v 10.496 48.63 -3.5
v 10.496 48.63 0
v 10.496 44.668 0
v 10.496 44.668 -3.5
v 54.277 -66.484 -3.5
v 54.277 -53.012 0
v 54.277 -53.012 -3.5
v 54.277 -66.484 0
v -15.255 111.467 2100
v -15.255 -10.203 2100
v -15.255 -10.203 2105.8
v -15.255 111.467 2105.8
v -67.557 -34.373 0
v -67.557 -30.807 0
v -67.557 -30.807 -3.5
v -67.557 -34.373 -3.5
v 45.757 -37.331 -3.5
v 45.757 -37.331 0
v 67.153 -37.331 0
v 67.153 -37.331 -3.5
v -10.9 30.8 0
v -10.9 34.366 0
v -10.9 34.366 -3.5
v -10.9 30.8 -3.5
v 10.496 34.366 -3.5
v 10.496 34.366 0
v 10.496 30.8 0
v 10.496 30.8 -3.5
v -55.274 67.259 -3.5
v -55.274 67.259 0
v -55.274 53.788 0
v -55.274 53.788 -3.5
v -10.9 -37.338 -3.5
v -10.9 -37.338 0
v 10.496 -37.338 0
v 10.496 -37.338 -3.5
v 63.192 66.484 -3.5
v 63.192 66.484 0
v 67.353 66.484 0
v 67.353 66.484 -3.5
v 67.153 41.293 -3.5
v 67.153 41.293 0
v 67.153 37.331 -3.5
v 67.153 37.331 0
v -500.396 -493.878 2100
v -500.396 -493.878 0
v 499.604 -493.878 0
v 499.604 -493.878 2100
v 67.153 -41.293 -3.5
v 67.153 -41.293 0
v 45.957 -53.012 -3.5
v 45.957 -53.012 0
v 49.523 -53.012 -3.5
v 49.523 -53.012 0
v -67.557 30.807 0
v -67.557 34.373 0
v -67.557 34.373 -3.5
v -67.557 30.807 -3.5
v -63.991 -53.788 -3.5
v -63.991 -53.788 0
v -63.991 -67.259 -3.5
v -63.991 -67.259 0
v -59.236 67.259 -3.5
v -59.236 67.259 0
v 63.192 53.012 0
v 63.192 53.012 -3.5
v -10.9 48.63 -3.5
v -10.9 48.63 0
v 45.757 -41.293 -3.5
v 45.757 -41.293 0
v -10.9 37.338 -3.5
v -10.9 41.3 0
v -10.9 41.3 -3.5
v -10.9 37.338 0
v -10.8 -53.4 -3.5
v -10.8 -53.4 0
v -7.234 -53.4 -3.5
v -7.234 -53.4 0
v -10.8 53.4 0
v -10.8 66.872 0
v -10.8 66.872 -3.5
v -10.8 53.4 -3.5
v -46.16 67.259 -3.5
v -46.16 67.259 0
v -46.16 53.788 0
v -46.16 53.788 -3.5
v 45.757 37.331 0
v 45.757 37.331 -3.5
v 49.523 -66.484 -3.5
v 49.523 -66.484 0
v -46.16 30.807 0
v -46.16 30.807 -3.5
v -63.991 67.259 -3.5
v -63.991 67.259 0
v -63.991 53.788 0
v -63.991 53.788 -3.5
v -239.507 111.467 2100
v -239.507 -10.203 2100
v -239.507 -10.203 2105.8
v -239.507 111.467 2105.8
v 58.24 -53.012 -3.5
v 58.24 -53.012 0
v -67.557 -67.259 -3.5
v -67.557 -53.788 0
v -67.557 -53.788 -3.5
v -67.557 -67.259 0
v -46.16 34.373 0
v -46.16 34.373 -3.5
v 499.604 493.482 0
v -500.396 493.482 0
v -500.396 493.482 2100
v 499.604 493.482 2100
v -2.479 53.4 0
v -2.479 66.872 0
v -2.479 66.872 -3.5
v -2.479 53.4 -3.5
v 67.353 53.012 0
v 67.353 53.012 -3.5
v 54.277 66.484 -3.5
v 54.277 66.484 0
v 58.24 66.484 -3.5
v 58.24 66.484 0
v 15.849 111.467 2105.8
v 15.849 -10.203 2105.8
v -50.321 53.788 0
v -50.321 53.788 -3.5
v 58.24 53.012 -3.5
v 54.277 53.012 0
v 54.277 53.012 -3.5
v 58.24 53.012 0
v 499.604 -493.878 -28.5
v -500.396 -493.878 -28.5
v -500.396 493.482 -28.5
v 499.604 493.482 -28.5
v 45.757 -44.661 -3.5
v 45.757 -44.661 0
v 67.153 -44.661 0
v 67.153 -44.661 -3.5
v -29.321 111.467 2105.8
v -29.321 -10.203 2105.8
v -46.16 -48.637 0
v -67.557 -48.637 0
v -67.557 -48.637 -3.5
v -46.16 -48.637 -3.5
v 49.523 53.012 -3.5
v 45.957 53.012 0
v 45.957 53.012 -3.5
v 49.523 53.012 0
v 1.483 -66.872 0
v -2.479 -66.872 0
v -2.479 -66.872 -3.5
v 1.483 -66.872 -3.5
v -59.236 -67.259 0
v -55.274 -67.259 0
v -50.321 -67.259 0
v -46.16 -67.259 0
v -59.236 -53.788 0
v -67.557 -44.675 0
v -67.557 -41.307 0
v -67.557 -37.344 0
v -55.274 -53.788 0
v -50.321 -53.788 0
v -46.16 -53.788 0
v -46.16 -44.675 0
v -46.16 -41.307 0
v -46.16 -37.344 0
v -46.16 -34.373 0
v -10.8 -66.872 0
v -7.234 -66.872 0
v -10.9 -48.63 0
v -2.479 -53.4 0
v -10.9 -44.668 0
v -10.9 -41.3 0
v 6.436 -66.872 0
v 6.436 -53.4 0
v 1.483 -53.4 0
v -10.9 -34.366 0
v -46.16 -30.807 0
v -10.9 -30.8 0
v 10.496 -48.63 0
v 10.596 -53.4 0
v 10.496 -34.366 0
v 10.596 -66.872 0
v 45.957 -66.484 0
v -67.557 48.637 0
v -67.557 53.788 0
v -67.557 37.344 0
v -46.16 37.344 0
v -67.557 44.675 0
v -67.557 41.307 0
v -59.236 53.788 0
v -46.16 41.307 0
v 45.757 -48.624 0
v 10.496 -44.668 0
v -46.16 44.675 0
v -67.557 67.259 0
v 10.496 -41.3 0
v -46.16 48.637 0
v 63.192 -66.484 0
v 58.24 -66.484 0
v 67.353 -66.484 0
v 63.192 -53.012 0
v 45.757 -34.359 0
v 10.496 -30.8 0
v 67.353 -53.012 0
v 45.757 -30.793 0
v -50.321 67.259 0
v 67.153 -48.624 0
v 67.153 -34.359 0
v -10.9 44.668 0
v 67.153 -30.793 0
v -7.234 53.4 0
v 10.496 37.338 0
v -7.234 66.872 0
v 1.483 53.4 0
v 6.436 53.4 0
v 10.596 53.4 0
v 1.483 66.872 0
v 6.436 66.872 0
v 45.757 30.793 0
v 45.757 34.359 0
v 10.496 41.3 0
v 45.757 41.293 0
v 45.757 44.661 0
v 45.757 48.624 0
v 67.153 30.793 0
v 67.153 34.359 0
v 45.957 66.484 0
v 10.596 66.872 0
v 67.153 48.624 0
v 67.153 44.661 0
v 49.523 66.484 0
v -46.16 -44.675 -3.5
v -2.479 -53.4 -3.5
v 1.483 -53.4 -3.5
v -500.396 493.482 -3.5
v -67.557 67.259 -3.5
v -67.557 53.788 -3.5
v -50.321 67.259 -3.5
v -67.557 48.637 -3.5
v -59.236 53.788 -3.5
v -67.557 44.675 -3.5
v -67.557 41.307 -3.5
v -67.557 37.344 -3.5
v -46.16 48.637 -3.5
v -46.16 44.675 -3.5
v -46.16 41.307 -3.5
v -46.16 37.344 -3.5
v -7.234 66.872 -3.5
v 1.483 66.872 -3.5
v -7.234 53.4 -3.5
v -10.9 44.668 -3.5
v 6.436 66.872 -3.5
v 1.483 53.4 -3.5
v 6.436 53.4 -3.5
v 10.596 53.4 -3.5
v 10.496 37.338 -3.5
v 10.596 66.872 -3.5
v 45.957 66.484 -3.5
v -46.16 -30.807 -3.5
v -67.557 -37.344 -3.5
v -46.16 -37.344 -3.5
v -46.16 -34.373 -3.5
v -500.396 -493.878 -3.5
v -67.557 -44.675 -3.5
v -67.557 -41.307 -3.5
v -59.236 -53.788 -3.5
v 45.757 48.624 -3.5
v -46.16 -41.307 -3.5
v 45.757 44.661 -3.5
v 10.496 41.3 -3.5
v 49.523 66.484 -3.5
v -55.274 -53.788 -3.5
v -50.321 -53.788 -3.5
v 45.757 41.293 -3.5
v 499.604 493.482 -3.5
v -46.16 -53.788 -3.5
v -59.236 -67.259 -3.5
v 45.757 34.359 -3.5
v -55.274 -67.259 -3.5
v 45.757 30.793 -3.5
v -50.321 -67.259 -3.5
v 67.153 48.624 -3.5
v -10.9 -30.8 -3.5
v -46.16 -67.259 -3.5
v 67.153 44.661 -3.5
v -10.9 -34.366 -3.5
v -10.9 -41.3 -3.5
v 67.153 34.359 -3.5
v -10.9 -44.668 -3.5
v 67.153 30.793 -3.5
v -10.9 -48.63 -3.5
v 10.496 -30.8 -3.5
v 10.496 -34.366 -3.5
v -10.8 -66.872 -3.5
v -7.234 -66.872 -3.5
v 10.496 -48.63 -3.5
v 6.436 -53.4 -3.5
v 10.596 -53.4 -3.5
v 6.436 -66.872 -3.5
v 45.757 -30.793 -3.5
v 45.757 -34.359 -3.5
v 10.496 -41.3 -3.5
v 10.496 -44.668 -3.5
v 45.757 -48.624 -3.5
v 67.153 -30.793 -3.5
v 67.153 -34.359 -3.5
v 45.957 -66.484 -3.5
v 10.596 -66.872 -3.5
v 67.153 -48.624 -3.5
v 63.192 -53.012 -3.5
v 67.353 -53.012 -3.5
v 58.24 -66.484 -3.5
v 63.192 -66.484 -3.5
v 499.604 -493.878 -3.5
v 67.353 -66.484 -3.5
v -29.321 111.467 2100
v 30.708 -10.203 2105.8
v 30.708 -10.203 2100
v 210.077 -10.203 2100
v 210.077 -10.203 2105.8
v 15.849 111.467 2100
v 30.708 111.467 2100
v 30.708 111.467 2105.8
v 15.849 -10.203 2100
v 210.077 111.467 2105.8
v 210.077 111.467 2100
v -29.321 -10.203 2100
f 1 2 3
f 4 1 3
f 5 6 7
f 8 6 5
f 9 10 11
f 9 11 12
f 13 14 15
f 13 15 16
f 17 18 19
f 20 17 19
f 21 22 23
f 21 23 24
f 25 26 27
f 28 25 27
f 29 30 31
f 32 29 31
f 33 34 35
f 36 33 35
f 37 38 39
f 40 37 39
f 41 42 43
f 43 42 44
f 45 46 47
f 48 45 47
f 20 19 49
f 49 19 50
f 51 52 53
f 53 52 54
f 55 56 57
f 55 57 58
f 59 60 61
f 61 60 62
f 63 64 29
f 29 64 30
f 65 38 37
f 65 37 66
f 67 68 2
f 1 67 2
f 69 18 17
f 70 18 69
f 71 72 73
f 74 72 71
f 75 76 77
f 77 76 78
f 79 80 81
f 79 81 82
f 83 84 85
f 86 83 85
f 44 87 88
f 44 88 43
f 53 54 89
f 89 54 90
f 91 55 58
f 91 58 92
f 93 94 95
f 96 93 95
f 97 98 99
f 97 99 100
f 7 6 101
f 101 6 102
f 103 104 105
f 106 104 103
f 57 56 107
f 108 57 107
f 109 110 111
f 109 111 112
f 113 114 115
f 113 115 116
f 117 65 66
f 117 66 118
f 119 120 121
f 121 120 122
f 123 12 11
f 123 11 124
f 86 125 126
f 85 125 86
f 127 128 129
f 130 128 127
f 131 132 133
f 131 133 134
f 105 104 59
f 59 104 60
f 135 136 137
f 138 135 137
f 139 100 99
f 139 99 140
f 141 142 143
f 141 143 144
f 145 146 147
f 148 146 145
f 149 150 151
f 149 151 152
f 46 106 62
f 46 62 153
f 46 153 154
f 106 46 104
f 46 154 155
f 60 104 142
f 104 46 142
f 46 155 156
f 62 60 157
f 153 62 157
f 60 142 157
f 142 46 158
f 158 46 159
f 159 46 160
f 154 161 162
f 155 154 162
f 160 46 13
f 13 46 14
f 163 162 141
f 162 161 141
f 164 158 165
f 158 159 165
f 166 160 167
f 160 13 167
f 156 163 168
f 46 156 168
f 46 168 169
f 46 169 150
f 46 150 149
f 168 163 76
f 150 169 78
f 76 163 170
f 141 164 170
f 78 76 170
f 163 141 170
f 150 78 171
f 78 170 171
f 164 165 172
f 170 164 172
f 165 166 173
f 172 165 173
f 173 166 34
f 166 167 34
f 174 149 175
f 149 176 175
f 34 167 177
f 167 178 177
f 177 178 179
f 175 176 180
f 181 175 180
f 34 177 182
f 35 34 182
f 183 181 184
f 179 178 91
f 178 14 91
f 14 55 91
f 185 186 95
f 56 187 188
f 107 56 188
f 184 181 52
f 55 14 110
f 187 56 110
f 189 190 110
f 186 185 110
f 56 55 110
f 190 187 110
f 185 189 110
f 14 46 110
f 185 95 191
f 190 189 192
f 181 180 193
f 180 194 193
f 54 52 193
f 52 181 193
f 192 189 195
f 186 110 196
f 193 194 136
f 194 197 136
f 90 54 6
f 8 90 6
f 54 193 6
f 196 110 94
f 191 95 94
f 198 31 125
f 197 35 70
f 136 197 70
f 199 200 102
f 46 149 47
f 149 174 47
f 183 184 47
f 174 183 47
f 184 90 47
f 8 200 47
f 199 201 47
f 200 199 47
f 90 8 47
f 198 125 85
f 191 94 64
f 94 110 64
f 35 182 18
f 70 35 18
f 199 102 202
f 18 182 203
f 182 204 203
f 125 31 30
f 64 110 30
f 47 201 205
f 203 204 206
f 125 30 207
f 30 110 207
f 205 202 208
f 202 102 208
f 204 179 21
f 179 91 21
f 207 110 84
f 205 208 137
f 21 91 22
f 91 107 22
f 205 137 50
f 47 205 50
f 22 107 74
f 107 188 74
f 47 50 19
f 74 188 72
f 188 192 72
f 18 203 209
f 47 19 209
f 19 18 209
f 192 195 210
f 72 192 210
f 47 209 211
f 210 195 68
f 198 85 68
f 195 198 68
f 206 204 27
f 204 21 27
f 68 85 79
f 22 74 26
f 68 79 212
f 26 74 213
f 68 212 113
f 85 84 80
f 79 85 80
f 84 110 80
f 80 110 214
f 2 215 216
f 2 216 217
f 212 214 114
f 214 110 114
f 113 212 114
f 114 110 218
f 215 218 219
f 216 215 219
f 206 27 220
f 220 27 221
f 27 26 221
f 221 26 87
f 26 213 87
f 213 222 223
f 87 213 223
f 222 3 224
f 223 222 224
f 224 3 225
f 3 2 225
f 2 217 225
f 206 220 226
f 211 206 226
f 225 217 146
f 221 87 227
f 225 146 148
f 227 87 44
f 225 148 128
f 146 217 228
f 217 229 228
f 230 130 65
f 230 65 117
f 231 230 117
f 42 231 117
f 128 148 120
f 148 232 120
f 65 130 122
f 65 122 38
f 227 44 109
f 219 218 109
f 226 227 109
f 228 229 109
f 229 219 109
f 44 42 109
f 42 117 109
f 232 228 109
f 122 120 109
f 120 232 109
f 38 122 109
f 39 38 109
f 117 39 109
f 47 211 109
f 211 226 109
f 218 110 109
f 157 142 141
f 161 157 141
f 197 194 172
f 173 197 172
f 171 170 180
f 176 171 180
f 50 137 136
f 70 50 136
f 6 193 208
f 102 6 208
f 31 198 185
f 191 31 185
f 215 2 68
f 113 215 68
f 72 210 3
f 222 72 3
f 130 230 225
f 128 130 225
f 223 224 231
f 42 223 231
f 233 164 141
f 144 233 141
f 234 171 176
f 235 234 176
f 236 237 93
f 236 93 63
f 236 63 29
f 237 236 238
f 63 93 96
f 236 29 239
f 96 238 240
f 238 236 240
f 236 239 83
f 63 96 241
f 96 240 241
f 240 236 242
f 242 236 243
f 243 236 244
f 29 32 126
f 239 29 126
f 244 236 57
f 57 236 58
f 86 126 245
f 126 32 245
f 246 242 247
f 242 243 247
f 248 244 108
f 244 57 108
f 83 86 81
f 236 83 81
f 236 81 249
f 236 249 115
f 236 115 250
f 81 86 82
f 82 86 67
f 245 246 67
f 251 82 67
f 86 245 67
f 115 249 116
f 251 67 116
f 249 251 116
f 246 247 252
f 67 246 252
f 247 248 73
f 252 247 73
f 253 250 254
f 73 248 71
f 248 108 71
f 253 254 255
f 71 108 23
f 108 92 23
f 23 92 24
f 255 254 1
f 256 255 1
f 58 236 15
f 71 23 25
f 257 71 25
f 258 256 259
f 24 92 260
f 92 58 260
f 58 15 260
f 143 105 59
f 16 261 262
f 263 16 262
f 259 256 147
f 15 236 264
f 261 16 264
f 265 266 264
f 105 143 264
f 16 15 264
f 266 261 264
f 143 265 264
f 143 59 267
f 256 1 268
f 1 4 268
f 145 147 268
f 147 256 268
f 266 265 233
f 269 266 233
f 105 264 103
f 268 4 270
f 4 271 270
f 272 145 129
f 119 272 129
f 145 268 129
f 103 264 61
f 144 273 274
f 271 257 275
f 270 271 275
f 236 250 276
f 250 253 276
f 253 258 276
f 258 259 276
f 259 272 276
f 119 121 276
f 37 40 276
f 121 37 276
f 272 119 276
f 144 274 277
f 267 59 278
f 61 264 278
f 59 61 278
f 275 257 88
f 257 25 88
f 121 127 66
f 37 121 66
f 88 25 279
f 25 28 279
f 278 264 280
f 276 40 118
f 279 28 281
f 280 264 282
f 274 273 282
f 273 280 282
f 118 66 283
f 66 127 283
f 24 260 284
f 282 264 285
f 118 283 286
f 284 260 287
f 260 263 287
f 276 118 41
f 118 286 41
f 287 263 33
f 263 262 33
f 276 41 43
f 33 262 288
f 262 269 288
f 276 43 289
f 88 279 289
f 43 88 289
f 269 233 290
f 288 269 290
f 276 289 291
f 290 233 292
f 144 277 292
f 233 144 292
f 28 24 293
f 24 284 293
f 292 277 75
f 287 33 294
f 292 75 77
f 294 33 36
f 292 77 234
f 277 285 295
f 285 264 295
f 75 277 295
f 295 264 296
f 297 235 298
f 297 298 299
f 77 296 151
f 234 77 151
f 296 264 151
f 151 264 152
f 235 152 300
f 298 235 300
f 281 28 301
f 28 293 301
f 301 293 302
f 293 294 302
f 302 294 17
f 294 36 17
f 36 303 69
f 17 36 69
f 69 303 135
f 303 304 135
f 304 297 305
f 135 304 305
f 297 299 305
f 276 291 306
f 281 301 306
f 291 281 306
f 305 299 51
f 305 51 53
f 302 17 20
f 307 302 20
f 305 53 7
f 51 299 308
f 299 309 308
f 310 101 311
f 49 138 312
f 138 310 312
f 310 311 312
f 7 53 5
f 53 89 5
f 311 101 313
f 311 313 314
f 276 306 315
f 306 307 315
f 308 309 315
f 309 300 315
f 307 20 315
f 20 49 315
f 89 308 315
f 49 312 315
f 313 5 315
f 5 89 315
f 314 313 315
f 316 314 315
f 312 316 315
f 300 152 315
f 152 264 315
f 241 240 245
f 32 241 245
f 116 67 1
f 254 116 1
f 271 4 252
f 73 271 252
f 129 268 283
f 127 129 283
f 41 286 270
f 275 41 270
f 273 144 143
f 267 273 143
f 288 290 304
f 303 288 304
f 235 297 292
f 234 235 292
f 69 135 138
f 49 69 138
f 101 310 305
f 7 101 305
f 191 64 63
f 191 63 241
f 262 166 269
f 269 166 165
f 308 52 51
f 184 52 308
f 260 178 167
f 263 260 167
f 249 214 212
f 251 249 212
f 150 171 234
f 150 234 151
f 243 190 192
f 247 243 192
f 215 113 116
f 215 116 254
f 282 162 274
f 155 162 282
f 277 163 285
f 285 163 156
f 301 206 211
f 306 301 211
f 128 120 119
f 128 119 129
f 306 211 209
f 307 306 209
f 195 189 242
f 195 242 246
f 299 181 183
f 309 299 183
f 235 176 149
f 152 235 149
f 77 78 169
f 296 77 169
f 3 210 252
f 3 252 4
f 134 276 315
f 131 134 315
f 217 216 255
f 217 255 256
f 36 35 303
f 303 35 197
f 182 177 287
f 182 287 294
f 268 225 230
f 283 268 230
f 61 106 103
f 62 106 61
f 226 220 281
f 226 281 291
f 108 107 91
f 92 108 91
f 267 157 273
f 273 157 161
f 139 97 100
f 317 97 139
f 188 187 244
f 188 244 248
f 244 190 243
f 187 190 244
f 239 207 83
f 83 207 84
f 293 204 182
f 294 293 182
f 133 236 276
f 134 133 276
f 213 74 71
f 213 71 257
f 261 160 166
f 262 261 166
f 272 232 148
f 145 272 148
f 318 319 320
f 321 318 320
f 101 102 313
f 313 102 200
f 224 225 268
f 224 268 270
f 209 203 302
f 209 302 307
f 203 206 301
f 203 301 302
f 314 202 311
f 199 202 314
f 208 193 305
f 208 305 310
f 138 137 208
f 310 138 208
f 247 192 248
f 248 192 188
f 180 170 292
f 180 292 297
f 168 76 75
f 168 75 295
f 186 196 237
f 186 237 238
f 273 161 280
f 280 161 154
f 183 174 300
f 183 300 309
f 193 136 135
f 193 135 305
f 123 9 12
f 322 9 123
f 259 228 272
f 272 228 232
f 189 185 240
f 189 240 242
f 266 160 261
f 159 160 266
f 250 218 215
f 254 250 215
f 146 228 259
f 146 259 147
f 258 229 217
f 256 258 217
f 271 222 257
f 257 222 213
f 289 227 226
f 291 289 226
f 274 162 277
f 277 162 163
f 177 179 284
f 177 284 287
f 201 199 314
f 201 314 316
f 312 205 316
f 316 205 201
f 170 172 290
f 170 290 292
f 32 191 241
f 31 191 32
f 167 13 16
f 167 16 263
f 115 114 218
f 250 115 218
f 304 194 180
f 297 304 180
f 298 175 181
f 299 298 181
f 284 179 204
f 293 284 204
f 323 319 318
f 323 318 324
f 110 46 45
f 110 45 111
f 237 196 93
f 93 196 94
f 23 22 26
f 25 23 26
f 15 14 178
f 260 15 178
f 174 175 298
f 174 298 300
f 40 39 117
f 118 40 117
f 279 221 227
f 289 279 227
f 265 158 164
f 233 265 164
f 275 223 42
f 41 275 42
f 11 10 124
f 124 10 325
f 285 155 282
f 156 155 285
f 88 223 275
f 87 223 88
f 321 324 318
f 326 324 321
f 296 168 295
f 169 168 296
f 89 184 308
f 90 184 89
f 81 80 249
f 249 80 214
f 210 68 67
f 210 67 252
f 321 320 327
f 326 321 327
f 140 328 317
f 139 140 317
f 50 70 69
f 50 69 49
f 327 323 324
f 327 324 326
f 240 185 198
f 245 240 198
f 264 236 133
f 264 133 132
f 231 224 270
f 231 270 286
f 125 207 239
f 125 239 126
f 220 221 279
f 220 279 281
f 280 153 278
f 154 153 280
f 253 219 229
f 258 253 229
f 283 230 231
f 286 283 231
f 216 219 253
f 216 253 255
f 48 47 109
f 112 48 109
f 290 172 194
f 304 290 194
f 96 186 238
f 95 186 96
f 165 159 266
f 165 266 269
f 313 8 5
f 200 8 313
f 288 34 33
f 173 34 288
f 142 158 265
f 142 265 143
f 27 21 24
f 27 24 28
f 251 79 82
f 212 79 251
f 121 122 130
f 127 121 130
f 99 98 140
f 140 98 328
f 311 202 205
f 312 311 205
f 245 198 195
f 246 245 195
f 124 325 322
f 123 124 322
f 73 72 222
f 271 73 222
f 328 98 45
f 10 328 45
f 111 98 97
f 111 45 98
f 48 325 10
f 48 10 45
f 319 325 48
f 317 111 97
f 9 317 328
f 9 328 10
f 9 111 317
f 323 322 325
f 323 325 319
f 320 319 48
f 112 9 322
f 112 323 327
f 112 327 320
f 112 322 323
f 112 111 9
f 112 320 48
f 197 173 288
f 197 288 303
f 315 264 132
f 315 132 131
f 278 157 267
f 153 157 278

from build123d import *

# Parameters (mm, degrees)
F0_W     = 1000
F0_H     = 987.3595376536
F0_W_2   = 884.8314134924
F0_H_2   = 869.3819947267
F1_DEPTH = 2100
F2_W     = 31.1037749052
F2_H     = 121.6697422788
F2_W_2   = 179.3690174818
F2_W_3   = 210.1863827556
F3_DEPTH = 5.8
F4_W     = 3.5660341382
F4_H     = 13.4717002511
F4_W_2   = 3.9622671902
F4_W_3   = 4.1603781283
F4_W_4   = 21.396227181
F4_H_2   = 3.9622634649
F4_H_3   = 3.9622671902
F4_H_4   = 3.5660378635
F5_DEPTH = 3.5
F6_W     = 1000
F6_H     = 987.3595376536
F6_W_2   = 3.5660341382
F6_H_2   = 13.4717002511
F7_DEPTH = 25


with BuildPart() as f1:
    # F0 (on Top) → F1 (new body)
    with BuildSketch(Plane.XY):
        with Locations((-0.3962293267, -0.1981146634)):
            Rectangle(F0_W, F0_H)
        with Locations((1.0083017027, -1.602592873)):
            Rectangle(F0_W_2, F0_H_2, mode=Mode.SUBTRACT)
        with Locations((1.0083017027, -1.602592873)):
            Rectangle(F0_W_2, F0_H_2)
    extrude(amount=F1_DEPTH)

    # F2 (on face) → F3 (join)
    with BuildSketch(Plane.XY.offset(2100)):
        with Locations((0.2971710637, 50.6320395507)):
            Rectangle(F2_W, F2_H)
        with Locations((120.3920580447, 50.6320395507)):
            Rectangle(F2_W_2, F2_H)
        with Locations((-134.4139473513, 50.6320395507)):
            Rectangle(F2_W_3, F2_H)
    extrude(amount=F3_DEPTH)

    # F4 (on face) → F5 (join)
    with BuildSketch(Plane(origin=(0, 0, 0), x_dir=(1, 0, 0), z_dir=(0, 0, -1))):
        with Locations((-65.7735876739, 60.5235882103)):
            Rectangle(F4_W, F4_H)
        with Locations((-57.2547186166, 60.5235882103)):
            Rectangle(F4_W_2, F4_H)
        with Locations((-48.2405666262, 60.5235882103)):
            Rectangle(F4_W_3, F4_H)
        with Locations((-9.0169829309, 60.1358501256)):
            Rectangle(F4_W, F4_H)
        with Locations((-0.4981138736, 60.1358501256)):
            Rectangle(F4_W_2, F4_H)
        with Locations((8.5160381168, 60.1358501256)):
            Rectangle(F4_W_3, F4_H)
        with Locations((47.7396218121, 59.7481120408)):
            Rectangle(F4_W, F4_H)
        with Locations((56.2584908694, 59.7481120408)):
            Rectangle(F4_W_2, F4_H)
        with Locations((65.2726428598, 59.7481120408)):
            Rectangle(F4_W_3, F4_H)
        with Locations((-57.2547186166, -60.5235882103)):
            Rectangle(F4_W_2, F4_H)
        with Locations((-65.7735876739, -60.5235882103)):
            Rectangle(F4_W, F4_H)
        with Locations((-48.2405666262, -60.5235882103)):
            Rectangle(F4_W_3, F4_H)
        with Locations((56.2584908694, -59.7481120408)):
            Rectangle(F4_W_2, F4_H)
        with Locations((-9.0169829309, -60.1358501256)):
            Rectangle(F4_W, F4_H)
        with Locations((47.7396218121, -59.7481120408)):
            Rectangle(F4_W, F4_H)
        with Locations((8.5160381168, -60.1358501256)):
            Rectangle(F4_W_3, F4_H)
        with Locations((-0.4981138736, -60.1358501256)):
            Rectangle(F4_W_2, F4_H)
        with Locations((65.2726428598, -59.7481120408)):
            Rectangle(F4_W_3, F4_H)
        with Locations((-56.8584911525, 46.6556623578)):
            Rectangle(F4_W_4, F4_H_2)
        with Locations((-56.8584911525, 39.3254738301)):
            Rectangle(F4_W_4, F4_H_3)
        with Locations((-56.8584911525, 32.5896237046)):
            Rectangle(F4_W_4, F4_H_4)
        with Locations((-0.2018864095, 39.3188690573)):
            Rectangle(F4_W_4, F4_H_3)
        with Locations((-0.2018864095, 46.649057585)):
            Rectangle(F4_W_4, F4_H_2)
        with Locations((-0.2018864095, 32.5830189317)):
            Rectangle(F4_W_4, F4_H_4)
        with Locations((56.4547183335, 39.3122642845)):
            Rectangle(F4_W_4, F4_H_3)
        with Locations((56.4547183335, 46.6424528122)):
            Rectangle(F4_W_4, F4_H_2)
        with Locations((56.4547183335, 32.5764141589)):
            Rectangle(F4_W_4, F4_H_4)
        with Locations((56.4547183335, -46.6424528122)):
            Rectangle(F4_W_4, F4_H_2)
        with Locations((-0.2018864095, -46.649057585)):
            Rectangle(F4_W_4, F4_H_2)
        with Locations((-0.2018864095, -32.5830189317)):
            Rectangle(F4_W_4, F4_H_4)
        with Locations((-56.8584911525, -46.6556623578)):
            Rectangle(F4_W_4, F4_H_2)
        with Locations((56.4547183335, -39.3122642845)):
            Rectangle(F4_W_4, F4_H_3)
        with Locations((-0.2018864095, -39.3188690573)):
            Rectangle(F4_W_4, F4_H_3)
        with Locations((-56.8584911525, -39.3254738301)):
            Rectangle(F4_W_4, F4_H_3)
        with Locations((-56.8584911525, -32.5896237046)):
            Rectangle(F4_W_4, F4_H_4)
        with Locations((56.4547183335, -32.5764141589)):
            Rectangle(F4_W_4, F4_H_4)
    extrude(amount=F5_DEPTH)

    # F6 (on face) → F7 (join)
    with BuildSketch(Plane(origin=(0, 0, -3.5), x_dir=(1, 0, 0), z_dir=(0, 0, -1))):
        with Locations((-0.3962293267, 0.1981146634)):
            Rectangle(F6_W, F6_H)
        with Locations((-65.7735876739, 60.5235882103)):
            Rectangle(F6_W_2, F6_H_2, mode=Mode.SUBTRACT)
        with Locations((-65.7735876739, 60.5235882103)):
            Rectangle(F6_W_2, F6_H_2)
    extrude(amount=F7_DEPTH)


solid = f1.part
